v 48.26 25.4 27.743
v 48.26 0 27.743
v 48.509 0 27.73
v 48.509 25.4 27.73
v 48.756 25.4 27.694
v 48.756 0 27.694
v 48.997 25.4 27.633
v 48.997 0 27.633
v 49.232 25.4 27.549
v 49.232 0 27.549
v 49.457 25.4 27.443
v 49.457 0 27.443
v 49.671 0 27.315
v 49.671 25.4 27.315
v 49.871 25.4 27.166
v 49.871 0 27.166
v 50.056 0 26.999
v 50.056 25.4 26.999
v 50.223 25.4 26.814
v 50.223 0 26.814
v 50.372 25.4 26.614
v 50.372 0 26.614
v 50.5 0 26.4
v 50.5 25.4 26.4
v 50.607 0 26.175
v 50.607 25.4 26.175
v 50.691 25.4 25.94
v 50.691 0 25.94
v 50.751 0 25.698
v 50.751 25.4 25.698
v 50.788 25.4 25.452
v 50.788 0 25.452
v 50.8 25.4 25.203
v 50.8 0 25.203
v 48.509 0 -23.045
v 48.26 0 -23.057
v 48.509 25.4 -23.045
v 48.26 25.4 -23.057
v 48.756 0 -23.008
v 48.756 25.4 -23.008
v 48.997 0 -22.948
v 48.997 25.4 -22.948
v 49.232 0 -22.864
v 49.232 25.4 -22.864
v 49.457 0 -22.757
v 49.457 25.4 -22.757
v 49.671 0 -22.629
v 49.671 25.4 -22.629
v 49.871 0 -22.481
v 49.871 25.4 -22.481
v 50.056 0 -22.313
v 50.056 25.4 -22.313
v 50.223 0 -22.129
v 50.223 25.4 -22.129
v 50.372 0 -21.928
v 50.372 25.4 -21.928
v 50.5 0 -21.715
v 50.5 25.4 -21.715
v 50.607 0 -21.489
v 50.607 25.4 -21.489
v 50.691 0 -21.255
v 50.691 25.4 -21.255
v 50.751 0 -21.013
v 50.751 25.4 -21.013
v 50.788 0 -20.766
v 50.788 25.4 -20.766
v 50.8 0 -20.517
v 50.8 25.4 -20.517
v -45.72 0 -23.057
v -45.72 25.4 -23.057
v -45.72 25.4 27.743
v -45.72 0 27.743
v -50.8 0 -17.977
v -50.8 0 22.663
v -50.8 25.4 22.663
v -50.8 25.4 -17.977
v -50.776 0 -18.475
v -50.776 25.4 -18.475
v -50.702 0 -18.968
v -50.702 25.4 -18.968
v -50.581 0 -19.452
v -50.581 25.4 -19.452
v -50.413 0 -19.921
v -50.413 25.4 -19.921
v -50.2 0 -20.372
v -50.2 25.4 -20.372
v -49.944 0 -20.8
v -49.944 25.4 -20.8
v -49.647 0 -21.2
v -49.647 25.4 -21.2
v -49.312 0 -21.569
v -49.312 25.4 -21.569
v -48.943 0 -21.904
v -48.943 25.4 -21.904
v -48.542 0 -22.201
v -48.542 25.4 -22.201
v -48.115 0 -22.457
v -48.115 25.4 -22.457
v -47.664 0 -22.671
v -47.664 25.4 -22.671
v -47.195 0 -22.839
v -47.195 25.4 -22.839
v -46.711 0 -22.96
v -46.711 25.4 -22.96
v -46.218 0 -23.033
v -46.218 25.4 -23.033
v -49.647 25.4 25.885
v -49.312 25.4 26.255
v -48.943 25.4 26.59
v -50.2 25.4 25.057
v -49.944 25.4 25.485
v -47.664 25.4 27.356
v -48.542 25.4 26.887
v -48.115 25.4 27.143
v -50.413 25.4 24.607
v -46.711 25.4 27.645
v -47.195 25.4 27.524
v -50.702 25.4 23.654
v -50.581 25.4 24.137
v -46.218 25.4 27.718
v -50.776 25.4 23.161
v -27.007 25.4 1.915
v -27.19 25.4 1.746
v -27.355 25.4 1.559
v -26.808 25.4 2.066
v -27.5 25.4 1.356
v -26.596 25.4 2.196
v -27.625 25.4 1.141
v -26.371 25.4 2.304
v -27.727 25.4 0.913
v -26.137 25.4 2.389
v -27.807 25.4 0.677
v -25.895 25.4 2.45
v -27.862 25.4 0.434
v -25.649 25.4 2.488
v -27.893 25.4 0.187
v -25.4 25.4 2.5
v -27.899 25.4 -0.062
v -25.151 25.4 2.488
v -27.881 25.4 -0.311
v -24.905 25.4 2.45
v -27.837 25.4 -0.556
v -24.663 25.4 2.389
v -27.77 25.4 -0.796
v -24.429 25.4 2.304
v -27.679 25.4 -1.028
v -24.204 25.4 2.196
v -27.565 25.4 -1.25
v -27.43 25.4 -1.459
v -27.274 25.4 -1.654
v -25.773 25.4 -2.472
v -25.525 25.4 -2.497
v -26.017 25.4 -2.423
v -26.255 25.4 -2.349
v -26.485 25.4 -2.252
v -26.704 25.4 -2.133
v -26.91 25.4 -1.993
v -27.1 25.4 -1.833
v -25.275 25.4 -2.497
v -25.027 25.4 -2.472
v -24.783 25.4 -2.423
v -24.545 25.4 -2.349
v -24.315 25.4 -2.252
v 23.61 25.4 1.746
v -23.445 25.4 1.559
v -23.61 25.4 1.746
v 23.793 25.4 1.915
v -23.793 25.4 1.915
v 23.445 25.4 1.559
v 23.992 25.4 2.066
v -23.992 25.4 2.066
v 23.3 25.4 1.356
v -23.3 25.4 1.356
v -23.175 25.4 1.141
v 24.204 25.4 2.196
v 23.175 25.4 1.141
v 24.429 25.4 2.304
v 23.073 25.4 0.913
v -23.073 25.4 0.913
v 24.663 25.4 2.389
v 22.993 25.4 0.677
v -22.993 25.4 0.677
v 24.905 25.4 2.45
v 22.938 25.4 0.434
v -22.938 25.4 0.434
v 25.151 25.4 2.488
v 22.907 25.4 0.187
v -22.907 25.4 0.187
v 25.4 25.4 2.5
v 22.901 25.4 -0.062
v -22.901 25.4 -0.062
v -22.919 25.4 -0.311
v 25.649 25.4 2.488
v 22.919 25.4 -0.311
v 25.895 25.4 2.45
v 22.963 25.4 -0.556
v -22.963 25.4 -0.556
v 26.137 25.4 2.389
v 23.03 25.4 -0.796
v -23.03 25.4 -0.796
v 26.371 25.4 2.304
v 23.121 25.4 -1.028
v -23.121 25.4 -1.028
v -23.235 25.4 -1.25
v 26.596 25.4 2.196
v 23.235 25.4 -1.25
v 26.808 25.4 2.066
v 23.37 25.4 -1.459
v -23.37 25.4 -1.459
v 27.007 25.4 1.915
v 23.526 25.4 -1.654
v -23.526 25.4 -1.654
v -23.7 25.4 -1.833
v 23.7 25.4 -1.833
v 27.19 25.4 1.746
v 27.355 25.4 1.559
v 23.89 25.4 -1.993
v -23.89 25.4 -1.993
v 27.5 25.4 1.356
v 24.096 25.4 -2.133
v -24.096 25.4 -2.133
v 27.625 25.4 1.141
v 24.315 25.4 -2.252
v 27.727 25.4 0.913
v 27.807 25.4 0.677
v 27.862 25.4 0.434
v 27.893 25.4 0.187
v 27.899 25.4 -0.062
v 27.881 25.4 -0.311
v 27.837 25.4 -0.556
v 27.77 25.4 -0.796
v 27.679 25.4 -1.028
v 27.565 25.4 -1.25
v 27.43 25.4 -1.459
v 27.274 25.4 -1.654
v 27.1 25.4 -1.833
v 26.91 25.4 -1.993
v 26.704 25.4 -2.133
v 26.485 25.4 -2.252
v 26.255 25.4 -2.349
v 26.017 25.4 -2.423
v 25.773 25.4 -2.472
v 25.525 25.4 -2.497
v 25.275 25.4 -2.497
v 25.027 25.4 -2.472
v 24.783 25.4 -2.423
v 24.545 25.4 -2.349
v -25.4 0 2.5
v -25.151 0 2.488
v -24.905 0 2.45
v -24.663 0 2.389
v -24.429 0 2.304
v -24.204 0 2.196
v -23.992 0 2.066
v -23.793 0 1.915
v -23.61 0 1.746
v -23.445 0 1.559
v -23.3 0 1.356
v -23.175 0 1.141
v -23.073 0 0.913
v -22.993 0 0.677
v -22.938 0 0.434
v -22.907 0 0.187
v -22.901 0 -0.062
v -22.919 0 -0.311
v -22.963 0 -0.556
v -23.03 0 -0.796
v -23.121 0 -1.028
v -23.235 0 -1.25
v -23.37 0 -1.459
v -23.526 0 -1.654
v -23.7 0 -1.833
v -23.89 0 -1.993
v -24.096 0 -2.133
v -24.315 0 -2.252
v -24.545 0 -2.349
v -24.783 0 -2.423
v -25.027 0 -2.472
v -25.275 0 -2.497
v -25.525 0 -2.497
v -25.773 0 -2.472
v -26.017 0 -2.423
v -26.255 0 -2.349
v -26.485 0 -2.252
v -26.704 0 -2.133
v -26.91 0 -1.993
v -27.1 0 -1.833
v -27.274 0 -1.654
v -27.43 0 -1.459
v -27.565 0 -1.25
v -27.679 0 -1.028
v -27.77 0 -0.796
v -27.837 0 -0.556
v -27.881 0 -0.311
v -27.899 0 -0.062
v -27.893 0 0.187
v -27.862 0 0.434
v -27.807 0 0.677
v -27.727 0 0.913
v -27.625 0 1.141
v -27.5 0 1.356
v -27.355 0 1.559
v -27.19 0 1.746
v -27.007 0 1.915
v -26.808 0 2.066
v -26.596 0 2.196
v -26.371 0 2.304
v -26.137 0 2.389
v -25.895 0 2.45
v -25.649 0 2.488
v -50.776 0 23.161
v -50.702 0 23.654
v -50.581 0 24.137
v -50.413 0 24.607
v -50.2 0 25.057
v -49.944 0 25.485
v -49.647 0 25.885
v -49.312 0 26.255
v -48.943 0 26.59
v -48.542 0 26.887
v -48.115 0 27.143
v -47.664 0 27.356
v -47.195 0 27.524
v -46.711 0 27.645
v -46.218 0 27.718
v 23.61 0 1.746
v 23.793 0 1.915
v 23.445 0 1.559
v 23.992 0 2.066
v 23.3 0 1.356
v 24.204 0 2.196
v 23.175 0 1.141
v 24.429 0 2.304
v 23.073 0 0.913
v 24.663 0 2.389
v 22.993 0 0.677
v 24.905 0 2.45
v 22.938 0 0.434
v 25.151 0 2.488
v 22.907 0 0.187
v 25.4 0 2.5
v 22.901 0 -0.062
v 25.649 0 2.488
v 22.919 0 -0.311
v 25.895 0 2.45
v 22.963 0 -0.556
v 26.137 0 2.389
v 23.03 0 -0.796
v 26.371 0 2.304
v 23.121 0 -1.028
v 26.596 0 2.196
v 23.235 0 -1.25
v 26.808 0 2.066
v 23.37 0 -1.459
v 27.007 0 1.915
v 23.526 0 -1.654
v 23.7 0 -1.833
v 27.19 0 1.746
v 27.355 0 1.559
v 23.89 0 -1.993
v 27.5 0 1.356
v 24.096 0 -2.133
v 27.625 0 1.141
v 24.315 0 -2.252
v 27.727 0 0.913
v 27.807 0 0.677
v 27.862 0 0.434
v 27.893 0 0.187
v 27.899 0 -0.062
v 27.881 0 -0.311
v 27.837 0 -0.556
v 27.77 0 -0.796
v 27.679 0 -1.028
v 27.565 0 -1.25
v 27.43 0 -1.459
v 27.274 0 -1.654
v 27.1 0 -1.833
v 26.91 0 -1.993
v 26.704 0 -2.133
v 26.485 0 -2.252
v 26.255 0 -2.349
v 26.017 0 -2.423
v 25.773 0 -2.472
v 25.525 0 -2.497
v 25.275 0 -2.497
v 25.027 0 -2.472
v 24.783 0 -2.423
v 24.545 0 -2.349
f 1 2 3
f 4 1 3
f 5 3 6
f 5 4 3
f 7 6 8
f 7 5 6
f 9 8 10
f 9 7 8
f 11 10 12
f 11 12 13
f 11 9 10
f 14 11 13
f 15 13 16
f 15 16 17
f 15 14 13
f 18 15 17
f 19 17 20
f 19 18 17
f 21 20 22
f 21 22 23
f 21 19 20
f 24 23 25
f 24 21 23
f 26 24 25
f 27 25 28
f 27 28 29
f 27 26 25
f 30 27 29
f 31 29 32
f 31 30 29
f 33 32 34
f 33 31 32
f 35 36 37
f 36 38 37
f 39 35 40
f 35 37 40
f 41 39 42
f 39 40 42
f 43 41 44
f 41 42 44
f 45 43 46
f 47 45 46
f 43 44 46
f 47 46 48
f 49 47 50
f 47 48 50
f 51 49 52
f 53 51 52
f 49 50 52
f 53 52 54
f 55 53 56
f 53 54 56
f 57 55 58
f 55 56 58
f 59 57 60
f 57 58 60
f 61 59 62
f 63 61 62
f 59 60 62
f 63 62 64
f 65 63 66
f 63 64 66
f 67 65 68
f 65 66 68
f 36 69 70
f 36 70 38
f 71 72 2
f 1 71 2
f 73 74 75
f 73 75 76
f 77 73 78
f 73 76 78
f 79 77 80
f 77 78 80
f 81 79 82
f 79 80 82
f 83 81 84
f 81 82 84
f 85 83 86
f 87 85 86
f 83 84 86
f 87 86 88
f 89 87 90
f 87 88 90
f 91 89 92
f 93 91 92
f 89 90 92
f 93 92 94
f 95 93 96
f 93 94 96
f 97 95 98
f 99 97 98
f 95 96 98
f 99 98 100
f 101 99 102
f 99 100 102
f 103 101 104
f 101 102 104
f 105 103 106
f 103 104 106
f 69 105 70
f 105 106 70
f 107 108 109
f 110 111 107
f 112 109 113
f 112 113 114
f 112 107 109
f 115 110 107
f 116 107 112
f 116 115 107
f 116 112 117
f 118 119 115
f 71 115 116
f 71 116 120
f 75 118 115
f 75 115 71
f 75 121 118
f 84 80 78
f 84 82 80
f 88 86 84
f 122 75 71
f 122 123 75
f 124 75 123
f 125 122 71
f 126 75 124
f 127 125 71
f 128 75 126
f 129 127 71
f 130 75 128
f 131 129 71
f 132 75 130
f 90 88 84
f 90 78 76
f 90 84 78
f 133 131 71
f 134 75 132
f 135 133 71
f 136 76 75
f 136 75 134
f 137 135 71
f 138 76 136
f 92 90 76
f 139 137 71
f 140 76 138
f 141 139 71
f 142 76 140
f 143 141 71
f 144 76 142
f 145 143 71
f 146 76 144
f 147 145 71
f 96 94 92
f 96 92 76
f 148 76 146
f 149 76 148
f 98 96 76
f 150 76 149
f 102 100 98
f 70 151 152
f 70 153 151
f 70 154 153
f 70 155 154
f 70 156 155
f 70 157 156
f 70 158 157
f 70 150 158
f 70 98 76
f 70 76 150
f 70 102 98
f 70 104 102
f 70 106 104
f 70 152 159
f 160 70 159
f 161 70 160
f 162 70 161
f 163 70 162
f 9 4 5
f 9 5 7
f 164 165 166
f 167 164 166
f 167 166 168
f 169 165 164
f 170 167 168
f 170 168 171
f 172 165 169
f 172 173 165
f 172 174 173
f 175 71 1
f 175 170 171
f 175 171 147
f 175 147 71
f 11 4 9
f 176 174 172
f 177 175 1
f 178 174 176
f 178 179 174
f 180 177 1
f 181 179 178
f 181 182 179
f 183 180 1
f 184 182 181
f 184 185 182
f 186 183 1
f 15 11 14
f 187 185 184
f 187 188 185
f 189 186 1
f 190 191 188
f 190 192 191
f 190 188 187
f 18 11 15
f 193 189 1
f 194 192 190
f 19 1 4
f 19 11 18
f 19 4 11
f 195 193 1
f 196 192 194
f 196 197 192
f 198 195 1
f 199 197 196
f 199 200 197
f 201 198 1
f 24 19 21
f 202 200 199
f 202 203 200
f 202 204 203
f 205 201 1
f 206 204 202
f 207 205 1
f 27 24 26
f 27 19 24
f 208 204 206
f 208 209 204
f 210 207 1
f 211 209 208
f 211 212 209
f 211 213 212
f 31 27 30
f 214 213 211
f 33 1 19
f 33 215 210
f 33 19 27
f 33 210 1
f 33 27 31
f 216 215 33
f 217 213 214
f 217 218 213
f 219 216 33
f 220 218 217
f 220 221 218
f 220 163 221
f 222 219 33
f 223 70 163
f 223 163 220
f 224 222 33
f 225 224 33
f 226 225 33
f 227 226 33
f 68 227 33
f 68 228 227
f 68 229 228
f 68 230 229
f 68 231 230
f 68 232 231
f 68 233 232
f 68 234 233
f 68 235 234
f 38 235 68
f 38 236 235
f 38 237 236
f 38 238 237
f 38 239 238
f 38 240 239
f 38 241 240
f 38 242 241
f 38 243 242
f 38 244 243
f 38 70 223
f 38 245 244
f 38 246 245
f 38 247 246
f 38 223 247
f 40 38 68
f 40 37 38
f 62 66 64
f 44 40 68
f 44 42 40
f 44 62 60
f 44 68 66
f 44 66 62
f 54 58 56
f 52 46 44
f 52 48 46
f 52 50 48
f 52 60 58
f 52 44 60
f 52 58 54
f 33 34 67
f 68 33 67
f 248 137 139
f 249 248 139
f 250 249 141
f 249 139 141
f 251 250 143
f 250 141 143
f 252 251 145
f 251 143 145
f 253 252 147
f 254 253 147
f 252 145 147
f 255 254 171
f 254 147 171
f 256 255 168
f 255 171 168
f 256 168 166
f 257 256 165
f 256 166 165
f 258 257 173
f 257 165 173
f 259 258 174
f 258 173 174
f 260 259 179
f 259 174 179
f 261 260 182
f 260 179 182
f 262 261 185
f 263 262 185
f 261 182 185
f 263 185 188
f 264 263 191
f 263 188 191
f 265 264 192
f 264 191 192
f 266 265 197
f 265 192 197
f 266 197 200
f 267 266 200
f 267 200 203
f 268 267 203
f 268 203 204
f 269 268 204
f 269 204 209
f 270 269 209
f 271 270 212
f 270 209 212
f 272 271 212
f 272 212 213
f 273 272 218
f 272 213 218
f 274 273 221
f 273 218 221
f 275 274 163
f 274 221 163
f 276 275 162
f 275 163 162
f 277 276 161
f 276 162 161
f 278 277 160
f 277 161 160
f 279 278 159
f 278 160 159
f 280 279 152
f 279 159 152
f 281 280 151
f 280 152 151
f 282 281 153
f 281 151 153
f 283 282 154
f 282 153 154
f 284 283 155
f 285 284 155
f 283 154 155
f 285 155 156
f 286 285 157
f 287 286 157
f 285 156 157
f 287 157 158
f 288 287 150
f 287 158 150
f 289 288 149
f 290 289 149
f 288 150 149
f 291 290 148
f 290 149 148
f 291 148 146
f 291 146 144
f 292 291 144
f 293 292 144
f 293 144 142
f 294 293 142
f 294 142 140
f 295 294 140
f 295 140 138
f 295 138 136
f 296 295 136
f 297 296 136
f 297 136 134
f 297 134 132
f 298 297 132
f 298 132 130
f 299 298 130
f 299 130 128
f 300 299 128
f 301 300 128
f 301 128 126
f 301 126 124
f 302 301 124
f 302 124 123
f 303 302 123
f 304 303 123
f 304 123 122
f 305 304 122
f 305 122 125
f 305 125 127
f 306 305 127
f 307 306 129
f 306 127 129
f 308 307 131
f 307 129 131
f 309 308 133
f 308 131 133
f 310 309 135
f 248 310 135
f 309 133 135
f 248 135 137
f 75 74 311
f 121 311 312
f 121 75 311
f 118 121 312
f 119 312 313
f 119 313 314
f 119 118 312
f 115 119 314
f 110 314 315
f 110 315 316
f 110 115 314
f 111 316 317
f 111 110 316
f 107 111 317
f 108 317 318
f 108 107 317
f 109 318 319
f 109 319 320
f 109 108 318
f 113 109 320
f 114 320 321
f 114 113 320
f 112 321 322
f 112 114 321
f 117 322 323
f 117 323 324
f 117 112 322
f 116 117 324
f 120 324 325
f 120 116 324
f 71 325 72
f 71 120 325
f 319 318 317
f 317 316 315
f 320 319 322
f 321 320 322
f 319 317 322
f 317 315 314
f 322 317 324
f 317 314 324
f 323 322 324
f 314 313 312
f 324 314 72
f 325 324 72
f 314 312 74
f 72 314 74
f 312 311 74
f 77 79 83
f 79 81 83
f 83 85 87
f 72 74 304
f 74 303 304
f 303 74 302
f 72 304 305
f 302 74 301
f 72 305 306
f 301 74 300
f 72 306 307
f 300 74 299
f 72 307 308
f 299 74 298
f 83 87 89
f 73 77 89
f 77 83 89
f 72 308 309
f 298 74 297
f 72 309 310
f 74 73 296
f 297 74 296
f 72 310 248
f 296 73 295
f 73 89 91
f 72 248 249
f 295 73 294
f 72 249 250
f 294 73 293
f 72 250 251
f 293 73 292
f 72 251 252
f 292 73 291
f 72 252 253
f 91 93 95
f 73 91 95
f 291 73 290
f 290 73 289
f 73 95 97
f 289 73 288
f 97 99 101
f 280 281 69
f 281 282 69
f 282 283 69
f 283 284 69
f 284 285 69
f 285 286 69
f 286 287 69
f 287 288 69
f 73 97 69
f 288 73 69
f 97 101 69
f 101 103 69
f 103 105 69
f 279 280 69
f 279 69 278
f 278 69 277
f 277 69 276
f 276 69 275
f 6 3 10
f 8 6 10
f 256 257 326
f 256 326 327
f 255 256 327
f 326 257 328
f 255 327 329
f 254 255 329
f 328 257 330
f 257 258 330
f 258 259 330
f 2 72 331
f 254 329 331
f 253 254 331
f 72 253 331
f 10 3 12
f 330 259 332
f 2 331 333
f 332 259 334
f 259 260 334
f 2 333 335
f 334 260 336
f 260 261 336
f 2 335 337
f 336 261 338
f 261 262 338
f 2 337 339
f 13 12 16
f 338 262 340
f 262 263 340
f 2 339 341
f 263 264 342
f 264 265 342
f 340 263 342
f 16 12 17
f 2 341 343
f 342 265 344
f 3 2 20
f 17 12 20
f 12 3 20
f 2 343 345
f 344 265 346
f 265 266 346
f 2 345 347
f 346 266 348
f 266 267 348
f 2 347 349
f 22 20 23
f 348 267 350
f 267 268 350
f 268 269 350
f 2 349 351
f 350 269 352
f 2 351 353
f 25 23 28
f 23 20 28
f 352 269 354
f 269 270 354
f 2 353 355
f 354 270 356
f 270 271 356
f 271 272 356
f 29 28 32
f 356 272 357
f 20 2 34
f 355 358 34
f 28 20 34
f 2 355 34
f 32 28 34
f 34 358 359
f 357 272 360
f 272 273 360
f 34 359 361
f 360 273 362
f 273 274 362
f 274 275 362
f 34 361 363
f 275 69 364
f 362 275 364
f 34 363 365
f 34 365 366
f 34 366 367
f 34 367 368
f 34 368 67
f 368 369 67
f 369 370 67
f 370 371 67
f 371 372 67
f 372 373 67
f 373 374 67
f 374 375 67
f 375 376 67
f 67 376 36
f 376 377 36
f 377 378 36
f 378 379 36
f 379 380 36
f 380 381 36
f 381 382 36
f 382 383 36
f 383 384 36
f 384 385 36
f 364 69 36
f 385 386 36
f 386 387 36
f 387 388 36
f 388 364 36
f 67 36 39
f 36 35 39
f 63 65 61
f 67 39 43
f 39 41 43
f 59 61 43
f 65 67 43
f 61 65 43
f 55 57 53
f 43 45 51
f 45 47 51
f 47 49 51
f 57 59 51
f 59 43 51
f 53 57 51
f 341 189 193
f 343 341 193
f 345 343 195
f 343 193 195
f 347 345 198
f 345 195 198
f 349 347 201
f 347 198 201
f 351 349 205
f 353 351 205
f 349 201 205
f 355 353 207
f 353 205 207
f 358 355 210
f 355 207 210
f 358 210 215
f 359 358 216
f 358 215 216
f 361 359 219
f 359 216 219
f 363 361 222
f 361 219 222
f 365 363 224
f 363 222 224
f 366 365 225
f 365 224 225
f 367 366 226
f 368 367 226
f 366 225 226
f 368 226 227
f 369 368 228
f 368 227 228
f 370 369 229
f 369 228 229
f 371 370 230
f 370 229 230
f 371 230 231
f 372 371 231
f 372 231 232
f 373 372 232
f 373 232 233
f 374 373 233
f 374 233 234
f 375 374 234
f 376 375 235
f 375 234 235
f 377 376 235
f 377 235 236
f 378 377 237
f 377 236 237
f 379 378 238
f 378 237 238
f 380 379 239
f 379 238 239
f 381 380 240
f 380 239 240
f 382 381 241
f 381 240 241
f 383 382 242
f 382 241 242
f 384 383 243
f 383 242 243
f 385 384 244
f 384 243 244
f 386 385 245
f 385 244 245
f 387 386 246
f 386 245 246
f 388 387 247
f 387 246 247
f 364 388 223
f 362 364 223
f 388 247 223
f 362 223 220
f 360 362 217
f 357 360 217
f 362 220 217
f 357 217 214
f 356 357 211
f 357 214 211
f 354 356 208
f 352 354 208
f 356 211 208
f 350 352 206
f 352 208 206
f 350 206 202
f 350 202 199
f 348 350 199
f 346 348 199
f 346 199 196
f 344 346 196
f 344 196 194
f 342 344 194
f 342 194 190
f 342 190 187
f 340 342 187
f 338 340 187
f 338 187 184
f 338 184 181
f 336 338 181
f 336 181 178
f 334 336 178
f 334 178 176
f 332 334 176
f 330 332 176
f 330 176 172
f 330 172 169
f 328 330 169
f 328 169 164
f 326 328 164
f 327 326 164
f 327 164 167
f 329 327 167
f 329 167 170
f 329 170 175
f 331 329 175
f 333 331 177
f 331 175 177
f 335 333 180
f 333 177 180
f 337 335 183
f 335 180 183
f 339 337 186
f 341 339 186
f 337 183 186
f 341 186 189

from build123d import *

# Parameters (mm, degrees)
SKETCH1_W           = 101.6
SKETCH1_H           = 50.8
BOSS_EXTRUDE1_DEPTH = 25.4
FILLET1_R           = 5.08
FILLET2_R           = 2.54
SKETCH2_R           = 2.5
CUT_EXTRUDE1_DEPTH  = 25.4


with BuildPart() as part:
    # Sketch1 → Boss-Extrude1 (new body)
    with BuildSketch(Plane(origin=(0, 0, 0), x_dir=(1, 0, 0), z_dir=(0, 1, 0))):
        with Locations((0, -2.342718447)):
            Rectangle(SKETCH1_W, SKETCH1_H)
    extrude(amount=BOSS_EXTRUDE1_DEPTH)

    # Fillet1
    fillet1_edges = [part.edges().sort_by_distance(p)[0] for p in [
        (-50.8, 12.7, -23.057281553),
        (-50.8, 12.7, 27.742718447),
    ]]
    fillet(fillet1_edges, radius=FILLET1_R)

    # Fillet2
    fillet2_edges = [part.edges().sort_by_distance(p)[0] for p in [
        (50.8, 12.7, -23.057281553),
        (50.8, 12.7, 27.742718447),
    ]]
    fillet(fillet2_edges, radius=FILLET2_R)

    # Sketch2 → Cut-Extrude1 (cut)
    with BuildSketch(Plane(origin=(0, 25.4, 0), x_dir=(1, 0, 0), z_dir=(0, 1, 0))):
        with Locations(Location((-25.4, 0, 0), (0, 0, 270))):
            Circle(SKETCH2_R)
        with Locations(Location((25.4, 0, 0), (0, 0, 270))):
            Circle(SKETCH2_R)
    extrude(amount=-CUT_EXTRUDE1_DEPTH, mode=Mode.SUBTRACT)


solid = part.part
